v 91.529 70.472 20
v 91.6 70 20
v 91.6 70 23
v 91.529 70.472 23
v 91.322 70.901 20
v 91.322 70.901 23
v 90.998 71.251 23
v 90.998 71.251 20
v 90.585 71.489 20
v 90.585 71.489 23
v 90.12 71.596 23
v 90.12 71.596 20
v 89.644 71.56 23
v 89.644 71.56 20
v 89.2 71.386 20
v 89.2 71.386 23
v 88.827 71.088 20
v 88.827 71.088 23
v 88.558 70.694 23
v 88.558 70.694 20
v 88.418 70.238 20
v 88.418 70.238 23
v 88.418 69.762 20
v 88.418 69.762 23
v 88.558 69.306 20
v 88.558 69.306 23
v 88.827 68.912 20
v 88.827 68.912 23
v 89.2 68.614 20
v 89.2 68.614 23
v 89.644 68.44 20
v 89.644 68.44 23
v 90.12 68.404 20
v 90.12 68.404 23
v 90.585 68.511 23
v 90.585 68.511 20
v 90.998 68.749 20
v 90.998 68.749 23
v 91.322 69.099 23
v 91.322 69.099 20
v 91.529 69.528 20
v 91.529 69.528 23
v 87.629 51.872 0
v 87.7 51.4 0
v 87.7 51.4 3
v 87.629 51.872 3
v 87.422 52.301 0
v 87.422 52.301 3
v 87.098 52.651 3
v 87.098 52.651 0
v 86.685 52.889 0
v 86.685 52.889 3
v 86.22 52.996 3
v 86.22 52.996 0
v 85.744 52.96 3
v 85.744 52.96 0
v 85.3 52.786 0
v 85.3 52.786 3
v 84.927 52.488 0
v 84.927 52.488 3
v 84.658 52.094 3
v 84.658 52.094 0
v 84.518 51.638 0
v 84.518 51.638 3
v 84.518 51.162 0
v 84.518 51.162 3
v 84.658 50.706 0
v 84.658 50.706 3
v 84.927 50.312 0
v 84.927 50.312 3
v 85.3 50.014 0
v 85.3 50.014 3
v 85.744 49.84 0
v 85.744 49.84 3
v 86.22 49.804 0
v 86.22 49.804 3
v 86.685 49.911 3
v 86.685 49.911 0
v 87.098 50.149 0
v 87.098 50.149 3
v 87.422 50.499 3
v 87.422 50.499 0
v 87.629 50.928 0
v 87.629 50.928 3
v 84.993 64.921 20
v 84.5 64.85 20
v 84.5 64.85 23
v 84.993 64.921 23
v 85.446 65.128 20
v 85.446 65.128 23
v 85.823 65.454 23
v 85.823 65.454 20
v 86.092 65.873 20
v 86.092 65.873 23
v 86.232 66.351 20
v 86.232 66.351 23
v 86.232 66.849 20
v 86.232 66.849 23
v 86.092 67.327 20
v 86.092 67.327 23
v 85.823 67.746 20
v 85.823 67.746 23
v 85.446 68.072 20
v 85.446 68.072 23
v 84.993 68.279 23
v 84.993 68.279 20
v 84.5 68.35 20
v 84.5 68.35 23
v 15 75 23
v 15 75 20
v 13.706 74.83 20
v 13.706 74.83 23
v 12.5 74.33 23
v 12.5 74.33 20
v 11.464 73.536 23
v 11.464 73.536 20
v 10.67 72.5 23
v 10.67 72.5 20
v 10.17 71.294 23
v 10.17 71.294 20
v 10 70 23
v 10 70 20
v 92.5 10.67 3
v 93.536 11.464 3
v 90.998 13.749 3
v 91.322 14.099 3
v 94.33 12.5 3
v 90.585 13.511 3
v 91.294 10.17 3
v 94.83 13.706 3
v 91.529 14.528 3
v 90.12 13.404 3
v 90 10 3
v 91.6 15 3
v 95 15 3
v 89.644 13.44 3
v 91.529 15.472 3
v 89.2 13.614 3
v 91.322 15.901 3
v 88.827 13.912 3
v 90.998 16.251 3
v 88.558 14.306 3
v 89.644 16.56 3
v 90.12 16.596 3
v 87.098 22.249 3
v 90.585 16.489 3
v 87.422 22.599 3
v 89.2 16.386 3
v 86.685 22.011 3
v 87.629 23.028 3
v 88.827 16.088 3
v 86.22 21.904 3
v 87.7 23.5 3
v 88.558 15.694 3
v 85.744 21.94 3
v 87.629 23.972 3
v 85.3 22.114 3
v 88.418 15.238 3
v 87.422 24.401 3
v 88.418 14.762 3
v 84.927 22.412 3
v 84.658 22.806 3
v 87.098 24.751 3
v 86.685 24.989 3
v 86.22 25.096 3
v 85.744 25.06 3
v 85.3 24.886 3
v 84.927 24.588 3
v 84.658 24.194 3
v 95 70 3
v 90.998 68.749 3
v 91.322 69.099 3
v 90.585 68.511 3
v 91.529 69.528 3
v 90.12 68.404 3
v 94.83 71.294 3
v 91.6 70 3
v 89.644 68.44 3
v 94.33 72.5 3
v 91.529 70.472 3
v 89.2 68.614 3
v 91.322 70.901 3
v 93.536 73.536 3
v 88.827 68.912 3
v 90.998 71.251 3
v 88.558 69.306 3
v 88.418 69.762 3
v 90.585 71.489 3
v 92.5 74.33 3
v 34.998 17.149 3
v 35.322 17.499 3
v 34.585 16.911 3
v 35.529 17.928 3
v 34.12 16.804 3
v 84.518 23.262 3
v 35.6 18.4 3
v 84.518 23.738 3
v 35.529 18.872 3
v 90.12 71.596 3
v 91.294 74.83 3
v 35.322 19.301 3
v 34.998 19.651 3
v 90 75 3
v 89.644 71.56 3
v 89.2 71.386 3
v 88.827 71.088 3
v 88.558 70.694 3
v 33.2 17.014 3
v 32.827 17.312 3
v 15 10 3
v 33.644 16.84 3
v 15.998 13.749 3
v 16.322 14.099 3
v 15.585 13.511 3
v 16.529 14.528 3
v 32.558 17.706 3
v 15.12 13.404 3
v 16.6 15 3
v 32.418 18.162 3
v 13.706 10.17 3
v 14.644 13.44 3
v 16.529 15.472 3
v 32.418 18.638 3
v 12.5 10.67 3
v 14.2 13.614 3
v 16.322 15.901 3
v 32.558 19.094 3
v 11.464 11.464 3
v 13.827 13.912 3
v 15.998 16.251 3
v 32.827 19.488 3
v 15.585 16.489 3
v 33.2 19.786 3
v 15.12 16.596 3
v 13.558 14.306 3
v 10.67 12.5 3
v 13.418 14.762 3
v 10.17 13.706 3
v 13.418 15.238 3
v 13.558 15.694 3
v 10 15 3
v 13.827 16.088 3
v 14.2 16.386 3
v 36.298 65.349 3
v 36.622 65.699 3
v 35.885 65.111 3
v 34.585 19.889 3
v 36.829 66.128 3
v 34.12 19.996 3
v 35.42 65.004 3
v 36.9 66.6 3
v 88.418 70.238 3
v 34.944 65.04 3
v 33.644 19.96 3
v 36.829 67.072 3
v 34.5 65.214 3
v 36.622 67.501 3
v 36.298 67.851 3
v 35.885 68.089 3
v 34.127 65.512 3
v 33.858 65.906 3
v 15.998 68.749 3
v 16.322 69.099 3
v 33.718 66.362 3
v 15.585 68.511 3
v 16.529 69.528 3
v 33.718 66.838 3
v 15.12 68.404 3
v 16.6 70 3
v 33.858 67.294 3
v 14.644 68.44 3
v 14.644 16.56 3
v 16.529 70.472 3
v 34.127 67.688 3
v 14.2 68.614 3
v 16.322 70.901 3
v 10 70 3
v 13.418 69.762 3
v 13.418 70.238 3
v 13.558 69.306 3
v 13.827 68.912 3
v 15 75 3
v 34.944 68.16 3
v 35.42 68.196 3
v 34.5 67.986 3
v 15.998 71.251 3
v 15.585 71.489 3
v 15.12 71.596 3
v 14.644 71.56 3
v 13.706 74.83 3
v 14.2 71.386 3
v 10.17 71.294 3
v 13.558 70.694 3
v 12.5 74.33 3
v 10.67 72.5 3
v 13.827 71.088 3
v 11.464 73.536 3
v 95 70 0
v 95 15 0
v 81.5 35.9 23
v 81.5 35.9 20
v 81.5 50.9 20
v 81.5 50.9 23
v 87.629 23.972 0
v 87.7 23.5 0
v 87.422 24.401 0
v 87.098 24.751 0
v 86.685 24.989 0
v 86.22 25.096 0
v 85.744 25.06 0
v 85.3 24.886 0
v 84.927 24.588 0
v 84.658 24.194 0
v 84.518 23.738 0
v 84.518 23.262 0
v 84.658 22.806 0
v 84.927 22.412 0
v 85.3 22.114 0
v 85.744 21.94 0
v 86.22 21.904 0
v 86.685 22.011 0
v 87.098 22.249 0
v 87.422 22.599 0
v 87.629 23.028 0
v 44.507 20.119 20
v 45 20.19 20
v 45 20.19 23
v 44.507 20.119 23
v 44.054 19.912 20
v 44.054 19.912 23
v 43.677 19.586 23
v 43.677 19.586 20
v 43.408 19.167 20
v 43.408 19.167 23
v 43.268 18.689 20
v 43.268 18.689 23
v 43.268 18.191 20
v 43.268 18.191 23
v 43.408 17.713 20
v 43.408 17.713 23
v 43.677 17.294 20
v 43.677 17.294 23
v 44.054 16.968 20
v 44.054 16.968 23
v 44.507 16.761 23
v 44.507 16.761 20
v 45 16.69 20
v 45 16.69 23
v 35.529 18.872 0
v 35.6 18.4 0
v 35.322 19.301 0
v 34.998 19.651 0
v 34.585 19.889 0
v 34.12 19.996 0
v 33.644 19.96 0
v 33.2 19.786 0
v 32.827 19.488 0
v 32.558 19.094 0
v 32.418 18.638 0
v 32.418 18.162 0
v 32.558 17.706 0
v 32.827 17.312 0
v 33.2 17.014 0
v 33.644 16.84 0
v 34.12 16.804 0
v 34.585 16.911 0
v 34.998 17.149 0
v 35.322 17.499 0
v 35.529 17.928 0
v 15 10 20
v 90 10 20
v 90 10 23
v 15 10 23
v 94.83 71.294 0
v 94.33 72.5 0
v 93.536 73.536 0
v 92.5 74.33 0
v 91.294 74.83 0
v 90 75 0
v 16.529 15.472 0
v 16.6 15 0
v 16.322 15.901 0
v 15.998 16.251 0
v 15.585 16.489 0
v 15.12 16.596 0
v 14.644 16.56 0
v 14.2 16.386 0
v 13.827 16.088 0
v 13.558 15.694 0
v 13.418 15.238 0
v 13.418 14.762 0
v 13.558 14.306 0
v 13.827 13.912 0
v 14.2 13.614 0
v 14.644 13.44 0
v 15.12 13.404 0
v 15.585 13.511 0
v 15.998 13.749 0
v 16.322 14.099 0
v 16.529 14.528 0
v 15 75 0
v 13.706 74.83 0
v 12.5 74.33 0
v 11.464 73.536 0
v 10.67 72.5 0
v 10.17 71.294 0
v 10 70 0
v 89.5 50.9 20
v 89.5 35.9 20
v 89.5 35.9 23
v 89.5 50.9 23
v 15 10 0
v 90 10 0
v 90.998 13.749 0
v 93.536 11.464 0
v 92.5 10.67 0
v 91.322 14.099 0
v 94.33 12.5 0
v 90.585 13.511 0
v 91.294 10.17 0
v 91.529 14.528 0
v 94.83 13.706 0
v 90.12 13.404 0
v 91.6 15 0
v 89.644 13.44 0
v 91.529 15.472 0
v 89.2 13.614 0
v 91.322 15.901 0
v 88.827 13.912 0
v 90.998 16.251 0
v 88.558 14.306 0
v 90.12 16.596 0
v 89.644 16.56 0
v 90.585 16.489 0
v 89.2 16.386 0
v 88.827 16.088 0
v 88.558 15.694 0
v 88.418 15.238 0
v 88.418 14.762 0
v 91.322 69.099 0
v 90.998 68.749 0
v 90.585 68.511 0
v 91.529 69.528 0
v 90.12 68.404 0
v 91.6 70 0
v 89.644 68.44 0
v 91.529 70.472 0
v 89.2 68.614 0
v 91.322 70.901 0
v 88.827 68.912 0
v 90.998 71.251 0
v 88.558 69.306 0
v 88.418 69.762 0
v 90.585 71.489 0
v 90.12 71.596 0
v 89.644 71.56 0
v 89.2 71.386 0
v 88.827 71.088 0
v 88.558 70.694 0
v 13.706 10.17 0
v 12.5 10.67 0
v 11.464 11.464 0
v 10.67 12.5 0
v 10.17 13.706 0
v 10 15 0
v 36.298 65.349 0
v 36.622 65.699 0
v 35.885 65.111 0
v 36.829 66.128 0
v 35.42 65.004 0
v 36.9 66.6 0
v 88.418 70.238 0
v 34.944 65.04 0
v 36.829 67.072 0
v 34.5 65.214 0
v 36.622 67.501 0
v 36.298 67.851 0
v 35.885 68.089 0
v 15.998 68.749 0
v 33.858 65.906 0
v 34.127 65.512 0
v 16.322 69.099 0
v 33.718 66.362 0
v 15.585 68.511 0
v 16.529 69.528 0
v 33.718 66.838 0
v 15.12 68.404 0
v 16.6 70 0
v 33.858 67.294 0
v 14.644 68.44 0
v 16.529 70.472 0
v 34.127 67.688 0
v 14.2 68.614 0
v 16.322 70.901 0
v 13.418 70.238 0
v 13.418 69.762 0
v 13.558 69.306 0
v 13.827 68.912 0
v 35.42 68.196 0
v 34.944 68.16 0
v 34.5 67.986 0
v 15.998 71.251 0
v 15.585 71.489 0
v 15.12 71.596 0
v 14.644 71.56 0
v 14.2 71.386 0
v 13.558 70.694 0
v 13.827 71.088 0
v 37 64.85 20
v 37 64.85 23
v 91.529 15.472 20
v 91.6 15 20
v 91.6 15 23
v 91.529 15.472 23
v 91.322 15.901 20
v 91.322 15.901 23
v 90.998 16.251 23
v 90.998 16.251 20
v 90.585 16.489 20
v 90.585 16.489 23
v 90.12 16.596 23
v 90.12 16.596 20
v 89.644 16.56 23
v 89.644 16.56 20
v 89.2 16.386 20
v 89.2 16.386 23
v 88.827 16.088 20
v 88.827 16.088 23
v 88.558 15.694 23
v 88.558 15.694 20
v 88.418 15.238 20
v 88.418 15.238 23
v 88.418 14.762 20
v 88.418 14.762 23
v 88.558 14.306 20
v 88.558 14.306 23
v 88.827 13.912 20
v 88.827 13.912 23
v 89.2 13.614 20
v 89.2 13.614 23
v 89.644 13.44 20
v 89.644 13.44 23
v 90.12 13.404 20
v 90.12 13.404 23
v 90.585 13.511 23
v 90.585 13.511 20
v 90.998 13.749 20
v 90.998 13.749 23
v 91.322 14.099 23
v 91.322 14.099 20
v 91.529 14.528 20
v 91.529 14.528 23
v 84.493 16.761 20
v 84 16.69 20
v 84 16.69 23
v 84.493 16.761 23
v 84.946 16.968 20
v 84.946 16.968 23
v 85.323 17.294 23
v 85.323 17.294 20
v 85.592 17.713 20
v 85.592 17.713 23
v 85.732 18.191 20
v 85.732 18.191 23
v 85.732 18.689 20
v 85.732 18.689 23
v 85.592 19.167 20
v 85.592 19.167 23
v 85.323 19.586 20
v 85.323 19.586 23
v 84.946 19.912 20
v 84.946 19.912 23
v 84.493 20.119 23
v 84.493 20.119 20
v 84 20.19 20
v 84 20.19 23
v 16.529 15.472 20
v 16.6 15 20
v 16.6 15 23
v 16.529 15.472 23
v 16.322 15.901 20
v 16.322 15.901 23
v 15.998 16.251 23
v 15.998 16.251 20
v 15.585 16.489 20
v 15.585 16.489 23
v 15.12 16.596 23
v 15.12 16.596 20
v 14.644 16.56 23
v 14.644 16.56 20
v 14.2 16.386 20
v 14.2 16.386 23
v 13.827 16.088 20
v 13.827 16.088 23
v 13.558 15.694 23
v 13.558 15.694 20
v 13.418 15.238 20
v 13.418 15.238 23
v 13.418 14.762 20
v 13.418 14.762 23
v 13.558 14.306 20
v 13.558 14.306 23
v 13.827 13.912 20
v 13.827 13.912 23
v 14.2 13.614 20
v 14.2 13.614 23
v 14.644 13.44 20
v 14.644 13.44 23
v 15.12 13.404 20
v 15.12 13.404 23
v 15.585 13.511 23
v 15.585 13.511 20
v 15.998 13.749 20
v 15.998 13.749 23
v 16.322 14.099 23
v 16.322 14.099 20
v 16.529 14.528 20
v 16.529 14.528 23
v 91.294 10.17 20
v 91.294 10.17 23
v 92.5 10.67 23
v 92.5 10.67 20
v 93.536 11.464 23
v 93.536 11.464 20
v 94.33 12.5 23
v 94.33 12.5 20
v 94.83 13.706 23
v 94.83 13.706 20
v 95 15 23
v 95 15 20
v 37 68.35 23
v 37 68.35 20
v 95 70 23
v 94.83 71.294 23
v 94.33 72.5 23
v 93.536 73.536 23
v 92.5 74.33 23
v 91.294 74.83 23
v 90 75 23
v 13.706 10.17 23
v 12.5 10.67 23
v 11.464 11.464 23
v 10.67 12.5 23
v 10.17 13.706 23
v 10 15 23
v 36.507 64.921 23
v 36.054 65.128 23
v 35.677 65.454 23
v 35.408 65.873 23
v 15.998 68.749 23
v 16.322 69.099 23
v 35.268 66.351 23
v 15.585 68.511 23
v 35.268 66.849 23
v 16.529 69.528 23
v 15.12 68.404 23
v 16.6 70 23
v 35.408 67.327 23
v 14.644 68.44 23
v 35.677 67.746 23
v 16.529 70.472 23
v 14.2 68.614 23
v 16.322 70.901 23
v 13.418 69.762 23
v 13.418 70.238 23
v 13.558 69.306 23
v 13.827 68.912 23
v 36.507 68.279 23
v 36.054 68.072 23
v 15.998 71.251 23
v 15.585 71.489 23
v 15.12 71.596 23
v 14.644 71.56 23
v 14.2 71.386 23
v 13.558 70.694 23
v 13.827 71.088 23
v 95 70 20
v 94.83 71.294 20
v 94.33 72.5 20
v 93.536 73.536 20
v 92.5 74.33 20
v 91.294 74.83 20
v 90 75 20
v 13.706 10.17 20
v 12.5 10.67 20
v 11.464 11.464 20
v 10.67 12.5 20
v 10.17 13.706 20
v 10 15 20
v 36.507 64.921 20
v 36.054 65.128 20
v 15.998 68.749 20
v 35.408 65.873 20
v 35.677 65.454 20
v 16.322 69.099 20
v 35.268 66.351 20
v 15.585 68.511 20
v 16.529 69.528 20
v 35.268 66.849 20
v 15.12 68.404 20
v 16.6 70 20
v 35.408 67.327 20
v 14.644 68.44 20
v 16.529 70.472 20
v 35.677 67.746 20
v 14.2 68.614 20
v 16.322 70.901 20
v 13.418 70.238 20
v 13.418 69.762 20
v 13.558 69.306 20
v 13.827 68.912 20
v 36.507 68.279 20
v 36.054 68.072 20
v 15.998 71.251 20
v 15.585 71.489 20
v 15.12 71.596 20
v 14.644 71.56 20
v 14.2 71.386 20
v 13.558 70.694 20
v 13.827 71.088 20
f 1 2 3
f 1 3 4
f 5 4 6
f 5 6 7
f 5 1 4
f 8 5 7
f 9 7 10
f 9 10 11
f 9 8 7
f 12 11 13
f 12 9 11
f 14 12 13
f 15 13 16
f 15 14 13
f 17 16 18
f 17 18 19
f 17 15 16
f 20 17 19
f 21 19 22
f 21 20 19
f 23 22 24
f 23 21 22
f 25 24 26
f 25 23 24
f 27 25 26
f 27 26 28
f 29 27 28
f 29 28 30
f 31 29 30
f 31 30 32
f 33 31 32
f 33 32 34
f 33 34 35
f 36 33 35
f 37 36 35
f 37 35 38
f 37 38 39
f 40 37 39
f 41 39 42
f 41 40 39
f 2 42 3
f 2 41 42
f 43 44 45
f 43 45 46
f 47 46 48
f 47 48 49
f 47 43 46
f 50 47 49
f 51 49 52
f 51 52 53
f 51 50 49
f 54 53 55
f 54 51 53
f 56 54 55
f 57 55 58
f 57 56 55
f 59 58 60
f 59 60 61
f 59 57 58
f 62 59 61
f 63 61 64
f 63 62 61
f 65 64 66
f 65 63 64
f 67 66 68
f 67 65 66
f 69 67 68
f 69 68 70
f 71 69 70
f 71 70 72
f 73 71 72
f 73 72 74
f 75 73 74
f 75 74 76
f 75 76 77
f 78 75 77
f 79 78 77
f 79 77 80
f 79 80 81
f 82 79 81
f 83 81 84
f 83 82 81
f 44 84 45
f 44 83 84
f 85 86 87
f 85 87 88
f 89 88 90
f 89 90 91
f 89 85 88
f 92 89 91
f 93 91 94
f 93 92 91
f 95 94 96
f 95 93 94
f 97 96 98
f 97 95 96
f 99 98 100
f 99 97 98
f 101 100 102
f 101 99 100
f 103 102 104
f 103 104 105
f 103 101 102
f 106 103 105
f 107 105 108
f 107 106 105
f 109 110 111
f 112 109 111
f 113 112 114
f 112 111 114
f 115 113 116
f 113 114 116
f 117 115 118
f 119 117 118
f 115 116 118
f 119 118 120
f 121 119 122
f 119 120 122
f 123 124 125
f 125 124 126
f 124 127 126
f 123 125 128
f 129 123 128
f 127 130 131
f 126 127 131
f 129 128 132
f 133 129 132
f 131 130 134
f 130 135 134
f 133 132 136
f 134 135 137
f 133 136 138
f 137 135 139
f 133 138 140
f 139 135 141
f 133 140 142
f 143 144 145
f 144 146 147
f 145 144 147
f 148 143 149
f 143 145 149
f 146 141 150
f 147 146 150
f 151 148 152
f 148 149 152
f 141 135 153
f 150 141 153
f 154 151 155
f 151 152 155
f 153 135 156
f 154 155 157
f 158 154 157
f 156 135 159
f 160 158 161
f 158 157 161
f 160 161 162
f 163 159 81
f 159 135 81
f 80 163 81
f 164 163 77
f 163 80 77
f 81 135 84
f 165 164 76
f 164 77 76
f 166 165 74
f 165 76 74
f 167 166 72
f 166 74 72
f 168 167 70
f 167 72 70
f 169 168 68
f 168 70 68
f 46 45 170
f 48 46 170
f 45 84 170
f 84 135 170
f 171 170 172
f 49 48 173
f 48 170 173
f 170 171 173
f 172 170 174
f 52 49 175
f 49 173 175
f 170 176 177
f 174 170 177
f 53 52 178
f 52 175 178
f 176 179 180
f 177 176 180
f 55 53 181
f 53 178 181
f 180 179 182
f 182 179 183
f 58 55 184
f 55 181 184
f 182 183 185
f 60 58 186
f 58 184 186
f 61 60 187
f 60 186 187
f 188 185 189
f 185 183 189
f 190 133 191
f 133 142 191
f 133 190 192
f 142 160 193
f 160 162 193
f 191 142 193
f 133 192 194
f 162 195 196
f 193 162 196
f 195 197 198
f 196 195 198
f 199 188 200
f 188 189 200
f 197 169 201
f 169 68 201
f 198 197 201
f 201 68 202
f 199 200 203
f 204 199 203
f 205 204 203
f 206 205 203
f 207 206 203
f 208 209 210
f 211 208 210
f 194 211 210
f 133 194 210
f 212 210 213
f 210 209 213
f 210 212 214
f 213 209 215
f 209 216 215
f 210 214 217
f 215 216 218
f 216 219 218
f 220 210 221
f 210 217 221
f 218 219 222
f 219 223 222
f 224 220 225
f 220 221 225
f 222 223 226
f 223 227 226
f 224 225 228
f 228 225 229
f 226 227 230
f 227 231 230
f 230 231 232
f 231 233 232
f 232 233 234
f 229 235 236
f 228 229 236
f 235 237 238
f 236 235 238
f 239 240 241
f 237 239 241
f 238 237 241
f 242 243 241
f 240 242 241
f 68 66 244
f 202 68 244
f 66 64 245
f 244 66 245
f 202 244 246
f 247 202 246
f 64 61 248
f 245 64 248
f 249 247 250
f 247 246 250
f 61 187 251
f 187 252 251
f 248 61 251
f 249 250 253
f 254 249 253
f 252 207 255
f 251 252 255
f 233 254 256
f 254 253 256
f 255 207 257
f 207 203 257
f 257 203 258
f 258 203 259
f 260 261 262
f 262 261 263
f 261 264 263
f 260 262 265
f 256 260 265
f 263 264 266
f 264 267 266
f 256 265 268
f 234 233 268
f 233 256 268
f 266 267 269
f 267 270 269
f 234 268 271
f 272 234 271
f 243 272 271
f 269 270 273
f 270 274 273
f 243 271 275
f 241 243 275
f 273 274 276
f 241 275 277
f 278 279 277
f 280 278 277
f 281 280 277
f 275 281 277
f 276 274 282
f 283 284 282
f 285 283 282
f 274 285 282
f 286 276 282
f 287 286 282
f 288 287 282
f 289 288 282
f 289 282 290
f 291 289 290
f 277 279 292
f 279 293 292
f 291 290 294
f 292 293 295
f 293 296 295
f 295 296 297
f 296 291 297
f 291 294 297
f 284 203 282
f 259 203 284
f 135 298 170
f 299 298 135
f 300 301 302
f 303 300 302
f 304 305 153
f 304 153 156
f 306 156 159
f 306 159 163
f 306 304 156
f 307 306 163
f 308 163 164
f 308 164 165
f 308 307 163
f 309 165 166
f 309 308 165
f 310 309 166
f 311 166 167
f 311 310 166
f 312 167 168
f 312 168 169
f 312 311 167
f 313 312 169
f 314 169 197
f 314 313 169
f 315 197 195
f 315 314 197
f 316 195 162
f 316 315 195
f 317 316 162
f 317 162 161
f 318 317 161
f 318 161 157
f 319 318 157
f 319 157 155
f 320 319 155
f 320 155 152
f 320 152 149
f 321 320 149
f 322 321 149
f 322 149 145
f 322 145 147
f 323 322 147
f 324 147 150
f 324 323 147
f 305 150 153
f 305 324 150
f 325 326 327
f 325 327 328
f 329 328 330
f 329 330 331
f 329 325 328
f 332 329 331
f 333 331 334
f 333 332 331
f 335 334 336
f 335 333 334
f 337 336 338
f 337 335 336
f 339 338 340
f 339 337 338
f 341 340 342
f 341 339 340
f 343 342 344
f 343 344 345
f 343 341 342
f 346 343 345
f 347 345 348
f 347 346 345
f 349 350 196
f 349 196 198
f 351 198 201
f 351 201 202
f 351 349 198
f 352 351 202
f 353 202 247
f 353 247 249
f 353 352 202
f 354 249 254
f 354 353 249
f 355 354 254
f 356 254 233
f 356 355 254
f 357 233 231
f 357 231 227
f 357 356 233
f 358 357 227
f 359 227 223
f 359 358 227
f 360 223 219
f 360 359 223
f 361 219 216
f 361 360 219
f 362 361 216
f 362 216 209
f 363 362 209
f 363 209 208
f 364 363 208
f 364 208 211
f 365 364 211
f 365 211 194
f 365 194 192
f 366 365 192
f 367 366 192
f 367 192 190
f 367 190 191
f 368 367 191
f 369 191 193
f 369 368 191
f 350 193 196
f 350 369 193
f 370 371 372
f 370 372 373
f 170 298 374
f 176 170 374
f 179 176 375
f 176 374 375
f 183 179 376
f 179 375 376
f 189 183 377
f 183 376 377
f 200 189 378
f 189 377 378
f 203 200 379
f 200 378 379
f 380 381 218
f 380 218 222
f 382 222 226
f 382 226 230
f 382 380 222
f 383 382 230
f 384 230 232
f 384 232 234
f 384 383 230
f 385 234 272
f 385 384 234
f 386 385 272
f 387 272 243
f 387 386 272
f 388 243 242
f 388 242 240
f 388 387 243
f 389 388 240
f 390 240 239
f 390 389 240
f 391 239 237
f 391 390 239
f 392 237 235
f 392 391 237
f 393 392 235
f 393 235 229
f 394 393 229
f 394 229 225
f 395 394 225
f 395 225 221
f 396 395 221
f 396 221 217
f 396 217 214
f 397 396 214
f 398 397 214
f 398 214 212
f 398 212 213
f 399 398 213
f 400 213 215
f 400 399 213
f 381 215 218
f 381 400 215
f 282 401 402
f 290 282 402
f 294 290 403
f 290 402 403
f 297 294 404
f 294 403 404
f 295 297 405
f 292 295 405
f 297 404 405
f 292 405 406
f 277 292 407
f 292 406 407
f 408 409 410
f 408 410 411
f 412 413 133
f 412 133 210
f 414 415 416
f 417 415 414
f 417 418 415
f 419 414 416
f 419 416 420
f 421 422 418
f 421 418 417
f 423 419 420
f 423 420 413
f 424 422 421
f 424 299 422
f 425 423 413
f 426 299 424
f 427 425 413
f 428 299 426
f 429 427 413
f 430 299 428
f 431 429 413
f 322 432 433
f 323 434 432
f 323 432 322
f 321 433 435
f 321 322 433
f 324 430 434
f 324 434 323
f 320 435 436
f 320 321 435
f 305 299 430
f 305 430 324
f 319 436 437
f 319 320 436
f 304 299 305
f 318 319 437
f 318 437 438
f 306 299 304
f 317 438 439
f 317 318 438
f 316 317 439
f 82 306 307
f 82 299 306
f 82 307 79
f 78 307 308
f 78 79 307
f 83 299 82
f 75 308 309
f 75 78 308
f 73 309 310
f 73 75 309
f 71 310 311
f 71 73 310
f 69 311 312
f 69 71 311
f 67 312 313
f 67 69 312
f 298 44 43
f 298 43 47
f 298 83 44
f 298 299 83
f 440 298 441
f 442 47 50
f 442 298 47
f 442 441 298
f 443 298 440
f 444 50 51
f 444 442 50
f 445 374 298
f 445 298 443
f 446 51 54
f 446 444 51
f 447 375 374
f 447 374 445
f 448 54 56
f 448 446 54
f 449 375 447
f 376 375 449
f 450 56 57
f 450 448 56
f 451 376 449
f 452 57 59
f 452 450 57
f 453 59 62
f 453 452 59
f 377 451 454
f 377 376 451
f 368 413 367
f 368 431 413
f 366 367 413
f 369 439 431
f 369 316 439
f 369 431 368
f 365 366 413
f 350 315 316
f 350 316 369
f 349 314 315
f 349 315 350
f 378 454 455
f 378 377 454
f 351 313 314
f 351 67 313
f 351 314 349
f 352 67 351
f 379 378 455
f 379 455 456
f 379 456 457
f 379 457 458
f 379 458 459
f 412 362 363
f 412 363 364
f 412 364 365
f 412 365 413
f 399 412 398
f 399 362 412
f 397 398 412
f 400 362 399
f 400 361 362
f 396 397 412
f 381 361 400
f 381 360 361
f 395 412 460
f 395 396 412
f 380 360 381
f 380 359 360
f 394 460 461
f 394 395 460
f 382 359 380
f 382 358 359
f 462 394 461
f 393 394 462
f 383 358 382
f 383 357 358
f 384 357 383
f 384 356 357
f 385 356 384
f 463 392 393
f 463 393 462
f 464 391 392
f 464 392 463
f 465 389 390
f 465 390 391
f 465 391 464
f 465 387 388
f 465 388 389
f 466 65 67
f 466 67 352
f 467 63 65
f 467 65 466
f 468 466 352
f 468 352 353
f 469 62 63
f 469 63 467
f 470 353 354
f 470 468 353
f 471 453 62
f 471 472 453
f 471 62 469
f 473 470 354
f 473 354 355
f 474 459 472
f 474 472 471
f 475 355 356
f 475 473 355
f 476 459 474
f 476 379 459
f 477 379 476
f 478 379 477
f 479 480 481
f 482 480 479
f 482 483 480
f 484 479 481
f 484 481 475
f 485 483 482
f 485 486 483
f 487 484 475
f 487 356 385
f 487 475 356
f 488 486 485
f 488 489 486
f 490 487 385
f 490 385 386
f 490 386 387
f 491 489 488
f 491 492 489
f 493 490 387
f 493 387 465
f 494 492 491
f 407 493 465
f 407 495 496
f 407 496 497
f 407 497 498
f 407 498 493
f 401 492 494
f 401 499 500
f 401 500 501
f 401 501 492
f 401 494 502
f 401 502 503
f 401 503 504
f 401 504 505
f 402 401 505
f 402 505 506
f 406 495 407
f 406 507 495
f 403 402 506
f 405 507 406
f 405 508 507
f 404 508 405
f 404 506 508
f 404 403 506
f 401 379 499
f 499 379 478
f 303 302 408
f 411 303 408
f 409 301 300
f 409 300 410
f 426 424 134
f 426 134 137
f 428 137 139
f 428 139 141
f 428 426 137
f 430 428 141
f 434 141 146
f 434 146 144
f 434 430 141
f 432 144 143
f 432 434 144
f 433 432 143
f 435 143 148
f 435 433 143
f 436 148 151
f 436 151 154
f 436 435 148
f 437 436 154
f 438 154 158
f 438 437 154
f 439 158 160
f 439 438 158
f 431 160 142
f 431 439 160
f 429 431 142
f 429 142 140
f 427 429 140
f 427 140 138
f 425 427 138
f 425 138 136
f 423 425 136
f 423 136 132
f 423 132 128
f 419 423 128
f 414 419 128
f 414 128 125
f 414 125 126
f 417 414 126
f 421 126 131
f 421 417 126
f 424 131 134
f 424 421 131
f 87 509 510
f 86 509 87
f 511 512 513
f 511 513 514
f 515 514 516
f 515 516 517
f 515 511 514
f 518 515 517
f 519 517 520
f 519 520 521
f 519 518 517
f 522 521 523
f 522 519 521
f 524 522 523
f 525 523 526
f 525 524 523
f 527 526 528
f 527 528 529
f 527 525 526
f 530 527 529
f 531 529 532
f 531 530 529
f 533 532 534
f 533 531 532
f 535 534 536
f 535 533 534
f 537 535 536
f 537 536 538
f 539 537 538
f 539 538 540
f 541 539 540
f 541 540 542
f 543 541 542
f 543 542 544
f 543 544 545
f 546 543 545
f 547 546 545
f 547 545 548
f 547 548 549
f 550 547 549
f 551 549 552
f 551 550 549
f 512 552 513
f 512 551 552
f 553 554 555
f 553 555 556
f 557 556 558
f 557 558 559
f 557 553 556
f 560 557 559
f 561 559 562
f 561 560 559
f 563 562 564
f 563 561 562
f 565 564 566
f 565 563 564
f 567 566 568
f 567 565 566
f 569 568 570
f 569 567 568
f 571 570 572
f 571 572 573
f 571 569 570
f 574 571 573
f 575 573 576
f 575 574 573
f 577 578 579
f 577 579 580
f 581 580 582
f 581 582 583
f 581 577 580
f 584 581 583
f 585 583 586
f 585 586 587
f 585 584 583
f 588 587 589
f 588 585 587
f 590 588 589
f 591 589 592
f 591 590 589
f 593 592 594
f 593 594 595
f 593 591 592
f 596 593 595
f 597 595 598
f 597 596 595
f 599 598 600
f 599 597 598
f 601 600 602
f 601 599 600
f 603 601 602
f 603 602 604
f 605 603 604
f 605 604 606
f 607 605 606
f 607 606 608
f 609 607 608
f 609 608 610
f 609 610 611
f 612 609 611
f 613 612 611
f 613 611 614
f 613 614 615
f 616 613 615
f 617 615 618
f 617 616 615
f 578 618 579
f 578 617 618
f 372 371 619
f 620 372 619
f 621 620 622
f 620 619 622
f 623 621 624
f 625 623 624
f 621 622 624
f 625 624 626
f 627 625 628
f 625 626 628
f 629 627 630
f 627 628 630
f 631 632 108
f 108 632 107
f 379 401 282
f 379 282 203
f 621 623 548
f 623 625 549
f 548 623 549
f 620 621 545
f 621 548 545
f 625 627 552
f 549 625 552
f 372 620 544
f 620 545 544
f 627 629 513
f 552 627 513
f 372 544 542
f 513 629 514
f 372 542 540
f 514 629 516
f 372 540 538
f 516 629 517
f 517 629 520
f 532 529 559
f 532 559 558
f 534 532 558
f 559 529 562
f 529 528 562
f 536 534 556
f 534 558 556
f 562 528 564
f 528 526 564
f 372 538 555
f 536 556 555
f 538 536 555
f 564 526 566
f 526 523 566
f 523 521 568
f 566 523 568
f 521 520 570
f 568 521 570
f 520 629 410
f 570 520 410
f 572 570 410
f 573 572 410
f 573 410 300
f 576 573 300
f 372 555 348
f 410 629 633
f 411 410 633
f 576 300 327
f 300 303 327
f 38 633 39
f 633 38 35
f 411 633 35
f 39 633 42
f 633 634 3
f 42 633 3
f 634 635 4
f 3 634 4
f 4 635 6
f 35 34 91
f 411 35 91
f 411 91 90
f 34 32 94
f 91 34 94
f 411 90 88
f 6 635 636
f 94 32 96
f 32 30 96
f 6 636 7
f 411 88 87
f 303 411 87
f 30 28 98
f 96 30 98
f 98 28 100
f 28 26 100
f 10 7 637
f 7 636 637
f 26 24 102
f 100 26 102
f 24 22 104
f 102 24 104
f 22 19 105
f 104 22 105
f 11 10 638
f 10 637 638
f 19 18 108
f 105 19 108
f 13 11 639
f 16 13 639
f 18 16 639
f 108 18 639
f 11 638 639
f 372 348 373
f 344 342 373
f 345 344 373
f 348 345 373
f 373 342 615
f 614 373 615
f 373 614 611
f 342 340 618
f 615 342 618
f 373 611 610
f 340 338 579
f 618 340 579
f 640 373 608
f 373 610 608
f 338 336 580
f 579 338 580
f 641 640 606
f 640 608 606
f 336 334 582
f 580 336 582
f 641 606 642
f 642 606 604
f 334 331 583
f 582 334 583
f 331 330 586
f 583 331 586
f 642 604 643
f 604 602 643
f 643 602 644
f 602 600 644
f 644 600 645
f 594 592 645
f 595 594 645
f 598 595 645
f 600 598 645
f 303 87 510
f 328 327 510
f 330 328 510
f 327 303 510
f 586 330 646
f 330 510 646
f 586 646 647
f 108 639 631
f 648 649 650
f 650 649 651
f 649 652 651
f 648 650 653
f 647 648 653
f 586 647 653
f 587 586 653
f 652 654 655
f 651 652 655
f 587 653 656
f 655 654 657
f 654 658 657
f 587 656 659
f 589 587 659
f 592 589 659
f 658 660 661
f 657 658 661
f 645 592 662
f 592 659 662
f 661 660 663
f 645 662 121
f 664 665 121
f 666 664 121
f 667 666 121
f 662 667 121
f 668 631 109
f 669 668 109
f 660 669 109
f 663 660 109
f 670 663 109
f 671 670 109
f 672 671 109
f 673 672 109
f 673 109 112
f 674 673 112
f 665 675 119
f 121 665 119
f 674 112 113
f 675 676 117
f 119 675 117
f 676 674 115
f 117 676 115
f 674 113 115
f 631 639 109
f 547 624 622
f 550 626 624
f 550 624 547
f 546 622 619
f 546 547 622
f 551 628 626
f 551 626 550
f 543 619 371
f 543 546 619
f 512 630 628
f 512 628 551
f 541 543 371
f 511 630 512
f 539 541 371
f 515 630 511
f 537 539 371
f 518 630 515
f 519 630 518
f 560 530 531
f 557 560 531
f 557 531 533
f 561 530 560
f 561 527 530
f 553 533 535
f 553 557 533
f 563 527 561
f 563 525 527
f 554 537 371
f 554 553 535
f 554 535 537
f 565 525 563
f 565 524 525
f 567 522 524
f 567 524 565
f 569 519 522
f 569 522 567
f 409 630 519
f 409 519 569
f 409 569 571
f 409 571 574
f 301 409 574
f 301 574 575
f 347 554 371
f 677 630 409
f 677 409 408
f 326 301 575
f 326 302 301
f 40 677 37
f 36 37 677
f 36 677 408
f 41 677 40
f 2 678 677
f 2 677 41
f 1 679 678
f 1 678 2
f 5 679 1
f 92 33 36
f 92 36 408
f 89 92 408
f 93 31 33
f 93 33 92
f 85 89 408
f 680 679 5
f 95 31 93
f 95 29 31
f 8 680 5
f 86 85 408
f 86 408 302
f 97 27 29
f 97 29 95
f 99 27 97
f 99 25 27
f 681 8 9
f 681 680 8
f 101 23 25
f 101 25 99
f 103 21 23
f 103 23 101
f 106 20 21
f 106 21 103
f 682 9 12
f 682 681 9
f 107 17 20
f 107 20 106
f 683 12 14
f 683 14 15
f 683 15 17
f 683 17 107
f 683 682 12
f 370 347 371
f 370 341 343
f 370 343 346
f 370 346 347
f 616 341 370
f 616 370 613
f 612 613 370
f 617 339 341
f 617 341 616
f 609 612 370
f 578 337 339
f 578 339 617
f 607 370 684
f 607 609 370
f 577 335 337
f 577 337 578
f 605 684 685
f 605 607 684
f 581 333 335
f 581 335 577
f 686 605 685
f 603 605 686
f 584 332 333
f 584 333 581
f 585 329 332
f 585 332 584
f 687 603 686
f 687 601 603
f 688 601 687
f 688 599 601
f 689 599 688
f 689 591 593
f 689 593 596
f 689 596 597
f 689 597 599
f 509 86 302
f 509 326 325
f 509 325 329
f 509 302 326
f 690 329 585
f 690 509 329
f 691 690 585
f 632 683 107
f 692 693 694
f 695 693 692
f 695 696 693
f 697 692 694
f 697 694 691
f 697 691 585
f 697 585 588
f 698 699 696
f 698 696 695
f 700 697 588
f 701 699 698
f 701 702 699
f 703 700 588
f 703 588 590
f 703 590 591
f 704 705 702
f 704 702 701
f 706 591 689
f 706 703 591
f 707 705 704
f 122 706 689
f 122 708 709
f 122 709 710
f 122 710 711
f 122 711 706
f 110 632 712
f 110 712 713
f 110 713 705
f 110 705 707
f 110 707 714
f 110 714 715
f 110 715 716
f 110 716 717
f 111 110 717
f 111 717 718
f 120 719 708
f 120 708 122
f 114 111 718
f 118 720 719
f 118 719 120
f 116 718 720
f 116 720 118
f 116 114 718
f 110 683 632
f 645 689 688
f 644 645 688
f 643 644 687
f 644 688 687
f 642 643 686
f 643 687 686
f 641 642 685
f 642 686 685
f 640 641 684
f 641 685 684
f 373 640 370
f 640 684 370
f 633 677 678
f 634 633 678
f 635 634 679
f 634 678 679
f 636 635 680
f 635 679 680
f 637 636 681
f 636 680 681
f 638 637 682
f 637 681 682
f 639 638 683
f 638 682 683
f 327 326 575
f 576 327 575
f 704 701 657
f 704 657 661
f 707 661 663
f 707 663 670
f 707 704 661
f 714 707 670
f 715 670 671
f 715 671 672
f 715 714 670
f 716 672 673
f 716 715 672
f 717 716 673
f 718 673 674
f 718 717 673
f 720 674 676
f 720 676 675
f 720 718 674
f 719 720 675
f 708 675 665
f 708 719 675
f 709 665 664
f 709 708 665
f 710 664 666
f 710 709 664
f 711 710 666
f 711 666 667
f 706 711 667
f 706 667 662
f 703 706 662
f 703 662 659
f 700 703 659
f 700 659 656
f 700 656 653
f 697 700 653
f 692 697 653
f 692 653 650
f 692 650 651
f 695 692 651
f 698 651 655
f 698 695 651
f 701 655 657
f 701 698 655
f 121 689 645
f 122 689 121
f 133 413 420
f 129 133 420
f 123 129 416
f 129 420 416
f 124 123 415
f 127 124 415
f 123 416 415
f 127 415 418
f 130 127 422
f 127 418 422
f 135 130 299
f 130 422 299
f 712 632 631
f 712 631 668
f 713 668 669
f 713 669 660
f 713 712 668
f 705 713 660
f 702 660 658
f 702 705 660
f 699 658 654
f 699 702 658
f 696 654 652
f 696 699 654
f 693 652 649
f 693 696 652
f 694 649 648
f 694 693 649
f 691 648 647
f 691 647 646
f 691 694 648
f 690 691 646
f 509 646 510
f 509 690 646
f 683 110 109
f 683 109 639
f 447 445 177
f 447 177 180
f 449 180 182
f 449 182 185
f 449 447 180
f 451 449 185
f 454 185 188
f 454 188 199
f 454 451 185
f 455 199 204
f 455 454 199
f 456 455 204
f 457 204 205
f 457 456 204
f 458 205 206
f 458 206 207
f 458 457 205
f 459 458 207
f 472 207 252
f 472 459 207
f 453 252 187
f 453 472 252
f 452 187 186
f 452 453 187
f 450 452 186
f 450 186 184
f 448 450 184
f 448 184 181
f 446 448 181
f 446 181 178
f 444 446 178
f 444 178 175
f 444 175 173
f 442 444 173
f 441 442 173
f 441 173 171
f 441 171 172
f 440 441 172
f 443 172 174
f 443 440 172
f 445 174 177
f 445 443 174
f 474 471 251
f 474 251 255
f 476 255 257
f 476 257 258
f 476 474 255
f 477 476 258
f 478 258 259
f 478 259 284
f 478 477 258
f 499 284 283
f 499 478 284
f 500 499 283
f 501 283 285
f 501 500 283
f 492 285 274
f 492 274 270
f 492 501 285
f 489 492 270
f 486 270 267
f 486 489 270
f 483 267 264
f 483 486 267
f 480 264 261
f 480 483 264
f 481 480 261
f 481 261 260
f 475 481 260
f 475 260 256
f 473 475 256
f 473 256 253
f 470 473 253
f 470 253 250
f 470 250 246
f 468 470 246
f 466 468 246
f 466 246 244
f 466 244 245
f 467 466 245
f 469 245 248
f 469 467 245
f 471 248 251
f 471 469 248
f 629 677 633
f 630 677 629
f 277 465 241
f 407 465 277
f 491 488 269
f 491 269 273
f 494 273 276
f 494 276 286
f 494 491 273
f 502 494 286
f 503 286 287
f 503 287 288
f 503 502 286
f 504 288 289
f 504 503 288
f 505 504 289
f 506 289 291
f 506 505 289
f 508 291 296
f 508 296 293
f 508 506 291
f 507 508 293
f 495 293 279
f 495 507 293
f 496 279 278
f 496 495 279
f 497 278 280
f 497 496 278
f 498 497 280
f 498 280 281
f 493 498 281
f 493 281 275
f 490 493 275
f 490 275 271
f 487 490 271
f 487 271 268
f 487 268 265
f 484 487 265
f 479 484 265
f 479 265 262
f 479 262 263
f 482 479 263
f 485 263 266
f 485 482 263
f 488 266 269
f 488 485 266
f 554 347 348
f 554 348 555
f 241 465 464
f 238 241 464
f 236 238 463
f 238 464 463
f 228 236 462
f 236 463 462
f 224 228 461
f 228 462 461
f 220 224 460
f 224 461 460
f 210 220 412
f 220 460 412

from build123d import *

# Parameters (mm, degrees)
SKETCH_R     = 1.6
PAD_DEPTH    = 3
SKETCH001_R  = 1.6
SKETCH001_W  = 8
SKETCH001_H  = 15
PAD001_DEPTH = 3


with BuildPart() as bottom:
    # Sketch → Pad (new body)
    with BuildSketch(Plane.XY):
        with BuildLine():
            Line((15, 75), (90, 75))
            ThreePointArc((95, 70), (93.535534, 73.535534), (90, 75))
            Line((95, 70), (95, 15))
            ThreePointArc((90, 10), (93.535534, 11.464466), (95, 15))
            Line((90, 10), (15, 10))
            ThreePointArc((10, 15), (11.464466, 11.464466), (15, 10))
            Line((10, 15), (10, 70))
            ThreePointArc((15, 75), (11.464466, 73.535534), (10, 70))
        make_face()
        with Locations((15, 70)):
            Circle(SKETCH_R, mode=Mode.SUBTRACT)
        with Locations((90, 70)):
            Circle(SKETCH_R, mode=Mode.SUBTRACT)
        with Locations((15, 15)):
            Circle(SKETCH_R, mode=Mode.SUBTRACT)
        with Locations((90, 15)):
            Circle(SKETCH_R, mode=Mode.SUBTRACT)
        with Locations((35.3, 66.6)):
            Circle(SKETCH_R, mode=Mode.SUBTRACT)
        with Locations((34, 18.4)):
            Circle(SKETCH_R, mode=Mode.SUBTRACT)
        with Locations((86.1, 23.5)):
            Circle(SKETCH_R, mode=Mode.SUBTRACT)
        with Locations((86.1, 51.4)):
            Circle(SKETCH_R, mode=Mode.SUBTRACT)
    extrude(amount=PAD_DEPTH)


with BuildPart() as top:
    # Sketch001 → Pad001 (new body)
    with BuildSketch(Plane.XY.offset(20)):
        with BuildLine():
            Line((15, 75), (90, 75))
            ThreePointArc((95, 70), (93.535534, 73.535534), (90, 75))
            Line((95, 70), (95, 15))
            ThreePointArc((90, 10), (93.535534, 11.464466), (95, 15))
            Line((90, 10), (15, 10))
            ThreePointArc((10, 15), (11.464466, 11.464466), (15, 10))
            Line((10, 15), (10, 70))
            ThreePointArc((15, 75), (11.464466, 73.535534), (10, 70))
        make_face()
        with Locations((15, 70)):
            Circle(SKETCH001_R, mode=Mode.SUBTRACT)
        with Locations((90, 70)):
            Circle(SKETCH001_R, mode=Mode.SUBTRACT)
        with Locations((15, 15)):
            Circle(SKETCH001_R, mode=Mode.SUBTRACT)
        with Locations((90, 15)):
            Circle(SKETCH001_R, mode=Mode.SUBTRACT)
        with BuildLine():
            Line((45, 20.190004), (84, 20.190004))
            ThreePointArc((84, 16.690004), (85.75, 18.440004), (84, 20.190004))
            Line((45, 16.690004), (84, 16.690004))
            ThreePointArc((45, 20.190004), (43.25, 18.440004), (45, 16.690004))
        make_face(mode=Mode.SUBTRACT)
        with BuildLine():
            Line((37, 68.35), (84.5, 68.35))
            ThreePointArc((84.5, 64.85), (86.25, 66.6), (84.5, 68.35))
            Line((37, 64.85), (84.5, 64.85))
            ThreePointArc((37, 68.35), (35.25, 66.6), (37, 64.85))
        make_face(mode=Mode.SUBTRACT)
        with Locations((85.5, 43.4)):
            Rectangle(SKETCH001_W, SKETCH001_H, mode=Mode.SUBTRACT)
    extrude(amount=PAD001_DEPTH)


solid = Compound([bottom.part, top.part])
